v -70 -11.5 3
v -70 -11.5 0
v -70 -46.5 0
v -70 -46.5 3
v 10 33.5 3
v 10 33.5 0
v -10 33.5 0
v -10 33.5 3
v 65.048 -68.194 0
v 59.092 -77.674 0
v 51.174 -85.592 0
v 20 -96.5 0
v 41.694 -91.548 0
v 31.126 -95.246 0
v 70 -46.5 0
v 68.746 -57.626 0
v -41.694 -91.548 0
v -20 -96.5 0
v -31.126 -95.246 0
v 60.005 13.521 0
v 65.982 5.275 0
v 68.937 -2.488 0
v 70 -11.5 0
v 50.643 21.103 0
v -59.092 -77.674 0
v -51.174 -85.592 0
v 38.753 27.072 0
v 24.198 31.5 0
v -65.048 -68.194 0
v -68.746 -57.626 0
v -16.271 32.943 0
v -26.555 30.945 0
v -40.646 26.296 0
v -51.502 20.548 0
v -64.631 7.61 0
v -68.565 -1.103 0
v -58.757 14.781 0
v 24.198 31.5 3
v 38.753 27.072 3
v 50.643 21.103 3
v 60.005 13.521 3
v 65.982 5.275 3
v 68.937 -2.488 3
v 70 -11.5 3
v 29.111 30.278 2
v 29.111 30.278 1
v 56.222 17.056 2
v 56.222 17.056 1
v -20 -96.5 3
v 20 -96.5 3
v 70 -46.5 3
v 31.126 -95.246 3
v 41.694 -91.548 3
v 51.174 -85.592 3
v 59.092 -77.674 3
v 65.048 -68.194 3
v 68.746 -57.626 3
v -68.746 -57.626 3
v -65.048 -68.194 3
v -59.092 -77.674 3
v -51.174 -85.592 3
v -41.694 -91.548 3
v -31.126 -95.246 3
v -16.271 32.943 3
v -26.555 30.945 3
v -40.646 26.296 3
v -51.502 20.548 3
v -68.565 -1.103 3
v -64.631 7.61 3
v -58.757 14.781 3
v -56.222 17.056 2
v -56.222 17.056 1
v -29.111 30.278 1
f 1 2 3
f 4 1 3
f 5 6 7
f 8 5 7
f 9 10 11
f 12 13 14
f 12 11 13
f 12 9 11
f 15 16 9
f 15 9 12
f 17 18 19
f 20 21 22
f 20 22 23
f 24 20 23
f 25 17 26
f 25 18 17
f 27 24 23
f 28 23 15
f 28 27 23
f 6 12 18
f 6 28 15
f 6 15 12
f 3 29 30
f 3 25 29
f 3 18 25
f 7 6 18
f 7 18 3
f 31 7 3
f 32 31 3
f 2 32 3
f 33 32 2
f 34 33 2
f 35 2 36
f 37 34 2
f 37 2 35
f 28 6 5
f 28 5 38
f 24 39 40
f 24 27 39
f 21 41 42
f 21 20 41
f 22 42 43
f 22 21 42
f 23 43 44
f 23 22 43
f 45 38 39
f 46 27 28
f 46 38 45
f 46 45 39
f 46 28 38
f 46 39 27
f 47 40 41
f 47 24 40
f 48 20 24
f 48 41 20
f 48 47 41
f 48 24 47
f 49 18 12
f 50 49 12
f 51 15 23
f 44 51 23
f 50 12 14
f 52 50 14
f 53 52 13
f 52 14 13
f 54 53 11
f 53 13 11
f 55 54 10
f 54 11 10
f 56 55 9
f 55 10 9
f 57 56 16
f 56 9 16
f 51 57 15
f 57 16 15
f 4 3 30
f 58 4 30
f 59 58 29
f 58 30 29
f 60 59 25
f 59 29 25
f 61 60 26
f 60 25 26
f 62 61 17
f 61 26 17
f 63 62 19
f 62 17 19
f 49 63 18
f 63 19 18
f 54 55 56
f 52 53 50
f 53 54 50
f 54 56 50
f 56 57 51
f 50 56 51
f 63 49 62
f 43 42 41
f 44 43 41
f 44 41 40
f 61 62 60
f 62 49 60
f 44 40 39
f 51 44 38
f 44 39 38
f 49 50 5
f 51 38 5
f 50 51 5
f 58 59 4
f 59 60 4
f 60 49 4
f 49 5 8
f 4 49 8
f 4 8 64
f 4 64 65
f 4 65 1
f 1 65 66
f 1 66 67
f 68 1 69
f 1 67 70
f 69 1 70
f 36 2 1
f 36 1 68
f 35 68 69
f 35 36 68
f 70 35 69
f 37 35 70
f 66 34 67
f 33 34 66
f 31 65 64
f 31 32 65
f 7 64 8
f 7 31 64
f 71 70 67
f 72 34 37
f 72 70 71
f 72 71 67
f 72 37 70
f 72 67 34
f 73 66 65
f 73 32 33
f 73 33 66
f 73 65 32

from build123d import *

# Parameters (mm, degrees)
BOSS_EXTRUDE1_DEPTH = 3


with BuildPart() as part:
    # Sketch1 → Boss-Extrude1 (new body)
    with BuildSketch(Plane.XY):
        with BuildLine():
            add(Edge.make_bspline(
                [(-70, -11.5), (-70, 26.5), (-18, 33.5), (-10, 33.5)],
                knots=[0, 0, 0, 0, 1, 1, 1, 1], degree=3))
            Line((-70, -11.5), (-70, -46.5))
            ThreePointArc((-70, -46.5), (-55.355339059, -81.855339059), (-20, -96.5))
            Line((-20, -96.5), (20, -96.5))
            ThreePointArc((20, -96.5), (55.355339059, -81.855339059), (70, -46.5))
            Line((70, -46.5), (70, -11.5))
            add(Edge.make_bspline(
                [(10, 33.5), (18, 33.5), (70, 26.5), (70, -11.5)],
                knots=[0, 0, 0, 0, 1, 1, 1, 1], degree=3))
            Line((10, 33.5), (-10, 33.5))
        make_face()
    extrude(amount=BOSS_EXTRUDE1_DEPTH)


solid = part.part
